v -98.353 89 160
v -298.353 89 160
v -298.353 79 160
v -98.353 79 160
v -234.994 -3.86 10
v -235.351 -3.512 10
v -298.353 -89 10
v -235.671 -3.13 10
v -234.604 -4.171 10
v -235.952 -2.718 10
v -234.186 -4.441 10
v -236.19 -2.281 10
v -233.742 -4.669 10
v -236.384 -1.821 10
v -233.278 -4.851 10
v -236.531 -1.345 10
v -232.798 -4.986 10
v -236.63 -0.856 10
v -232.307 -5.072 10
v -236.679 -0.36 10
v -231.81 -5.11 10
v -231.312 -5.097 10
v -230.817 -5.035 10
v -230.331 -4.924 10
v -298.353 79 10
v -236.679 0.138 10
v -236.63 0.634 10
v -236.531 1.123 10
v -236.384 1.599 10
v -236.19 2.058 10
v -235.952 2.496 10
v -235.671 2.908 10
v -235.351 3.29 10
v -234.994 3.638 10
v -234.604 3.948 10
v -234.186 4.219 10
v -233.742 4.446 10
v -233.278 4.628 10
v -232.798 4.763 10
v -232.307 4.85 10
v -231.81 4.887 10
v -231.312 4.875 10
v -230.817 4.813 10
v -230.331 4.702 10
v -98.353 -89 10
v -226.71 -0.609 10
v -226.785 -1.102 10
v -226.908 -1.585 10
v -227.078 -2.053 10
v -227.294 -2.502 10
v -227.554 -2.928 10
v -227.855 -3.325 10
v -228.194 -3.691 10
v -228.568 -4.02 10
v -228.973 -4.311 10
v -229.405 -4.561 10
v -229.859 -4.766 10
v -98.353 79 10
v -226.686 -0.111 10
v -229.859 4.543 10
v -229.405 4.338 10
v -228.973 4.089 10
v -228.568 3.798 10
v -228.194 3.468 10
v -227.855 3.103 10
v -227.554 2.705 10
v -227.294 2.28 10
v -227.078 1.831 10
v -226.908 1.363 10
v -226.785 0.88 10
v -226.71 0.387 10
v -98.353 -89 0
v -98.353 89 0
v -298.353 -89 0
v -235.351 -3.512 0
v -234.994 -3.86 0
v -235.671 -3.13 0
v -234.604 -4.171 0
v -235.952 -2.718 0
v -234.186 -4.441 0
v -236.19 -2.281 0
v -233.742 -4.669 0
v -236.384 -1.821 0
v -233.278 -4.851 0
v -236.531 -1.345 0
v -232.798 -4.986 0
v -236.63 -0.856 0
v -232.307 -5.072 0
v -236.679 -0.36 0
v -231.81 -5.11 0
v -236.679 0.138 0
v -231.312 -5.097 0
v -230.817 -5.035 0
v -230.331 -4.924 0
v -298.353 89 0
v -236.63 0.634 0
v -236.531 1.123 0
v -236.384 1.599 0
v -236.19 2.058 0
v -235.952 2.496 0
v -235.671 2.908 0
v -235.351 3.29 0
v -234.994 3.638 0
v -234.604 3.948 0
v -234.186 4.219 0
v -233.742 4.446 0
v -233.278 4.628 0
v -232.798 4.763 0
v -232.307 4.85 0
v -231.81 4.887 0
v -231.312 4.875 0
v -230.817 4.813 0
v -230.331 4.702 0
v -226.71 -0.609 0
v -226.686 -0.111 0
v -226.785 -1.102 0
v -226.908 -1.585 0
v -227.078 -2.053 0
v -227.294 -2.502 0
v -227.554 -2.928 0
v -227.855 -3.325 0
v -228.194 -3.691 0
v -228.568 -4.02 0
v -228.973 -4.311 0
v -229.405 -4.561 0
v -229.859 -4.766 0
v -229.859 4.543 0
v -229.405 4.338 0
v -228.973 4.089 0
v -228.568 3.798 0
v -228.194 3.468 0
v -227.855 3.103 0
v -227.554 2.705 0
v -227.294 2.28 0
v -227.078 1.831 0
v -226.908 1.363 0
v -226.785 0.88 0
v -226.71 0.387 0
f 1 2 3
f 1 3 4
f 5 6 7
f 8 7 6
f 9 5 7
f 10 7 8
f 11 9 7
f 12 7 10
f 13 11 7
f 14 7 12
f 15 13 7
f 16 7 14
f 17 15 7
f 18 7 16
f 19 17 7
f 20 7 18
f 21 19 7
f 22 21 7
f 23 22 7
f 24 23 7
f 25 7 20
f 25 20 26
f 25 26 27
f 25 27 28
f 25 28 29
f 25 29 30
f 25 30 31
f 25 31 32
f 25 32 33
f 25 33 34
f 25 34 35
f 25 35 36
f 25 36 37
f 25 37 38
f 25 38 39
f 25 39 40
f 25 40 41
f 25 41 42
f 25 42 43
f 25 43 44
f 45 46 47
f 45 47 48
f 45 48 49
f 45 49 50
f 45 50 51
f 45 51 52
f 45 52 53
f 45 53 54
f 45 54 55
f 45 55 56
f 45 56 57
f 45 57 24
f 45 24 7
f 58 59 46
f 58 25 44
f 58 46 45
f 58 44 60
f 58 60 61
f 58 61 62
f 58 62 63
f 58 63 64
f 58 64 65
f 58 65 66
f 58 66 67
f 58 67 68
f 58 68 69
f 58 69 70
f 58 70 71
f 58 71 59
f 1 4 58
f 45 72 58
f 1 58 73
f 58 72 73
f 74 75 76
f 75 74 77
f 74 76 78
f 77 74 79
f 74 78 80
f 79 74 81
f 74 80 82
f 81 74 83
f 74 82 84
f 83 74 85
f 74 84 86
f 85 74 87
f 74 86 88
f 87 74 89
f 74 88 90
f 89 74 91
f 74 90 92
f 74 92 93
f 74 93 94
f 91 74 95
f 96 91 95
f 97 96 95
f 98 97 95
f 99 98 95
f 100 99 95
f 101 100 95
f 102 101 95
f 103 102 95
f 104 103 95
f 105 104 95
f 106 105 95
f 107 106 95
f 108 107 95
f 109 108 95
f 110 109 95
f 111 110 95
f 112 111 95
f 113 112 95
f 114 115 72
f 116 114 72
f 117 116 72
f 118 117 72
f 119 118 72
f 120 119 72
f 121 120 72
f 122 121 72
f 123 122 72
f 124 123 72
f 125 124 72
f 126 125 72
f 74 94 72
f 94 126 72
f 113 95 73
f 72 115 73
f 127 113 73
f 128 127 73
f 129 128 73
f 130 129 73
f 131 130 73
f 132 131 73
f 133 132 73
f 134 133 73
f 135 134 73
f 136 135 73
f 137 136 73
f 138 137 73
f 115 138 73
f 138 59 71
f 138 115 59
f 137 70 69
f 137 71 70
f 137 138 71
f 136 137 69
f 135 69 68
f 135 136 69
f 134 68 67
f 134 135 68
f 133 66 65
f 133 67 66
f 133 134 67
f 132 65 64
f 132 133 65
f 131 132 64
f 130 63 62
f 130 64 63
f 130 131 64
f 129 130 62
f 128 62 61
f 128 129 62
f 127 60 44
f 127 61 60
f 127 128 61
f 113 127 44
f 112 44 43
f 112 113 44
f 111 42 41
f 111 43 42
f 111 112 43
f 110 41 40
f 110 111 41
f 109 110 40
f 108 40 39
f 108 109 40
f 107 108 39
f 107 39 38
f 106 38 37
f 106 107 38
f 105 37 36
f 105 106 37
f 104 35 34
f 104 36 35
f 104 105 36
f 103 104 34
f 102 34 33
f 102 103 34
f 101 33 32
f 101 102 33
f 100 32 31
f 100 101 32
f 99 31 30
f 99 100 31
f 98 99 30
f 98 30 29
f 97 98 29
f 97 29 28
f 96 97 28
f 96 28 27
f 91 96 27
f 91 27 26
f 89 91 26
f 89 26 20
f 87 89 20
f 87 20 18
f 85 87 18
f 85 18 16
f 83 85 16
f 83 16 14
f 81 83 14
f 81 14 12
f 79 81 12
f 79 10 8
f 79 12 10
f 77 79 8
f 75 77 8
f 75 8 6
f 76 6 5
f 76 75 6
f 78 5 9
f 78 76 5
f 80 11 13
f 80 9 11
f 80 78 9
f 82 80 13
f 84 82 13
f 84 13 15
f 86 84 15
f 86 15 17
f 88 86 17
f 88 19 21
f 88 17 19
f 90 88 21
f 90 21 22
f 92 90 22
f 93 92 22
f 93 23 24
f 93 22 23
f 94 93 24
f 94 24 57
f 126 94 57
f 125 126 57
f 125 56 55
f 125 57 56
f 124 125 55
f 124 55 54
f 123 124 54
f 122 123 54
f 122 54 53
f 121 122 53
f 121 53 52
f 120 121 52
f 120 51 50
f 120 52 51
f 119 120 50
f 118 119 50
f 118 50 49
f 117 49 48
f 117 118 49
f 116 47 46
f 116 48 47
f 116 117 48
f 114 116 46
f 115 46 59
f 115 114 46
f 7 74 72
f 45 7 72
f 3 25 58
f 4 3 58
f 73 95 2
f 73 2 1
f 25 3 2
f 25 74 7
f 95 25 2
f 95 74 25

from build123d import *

# Parameters (mm, degrees)
ESBO_O1_W                  = 200
ESBO_O1_H                  = 178
RESSALTO_EXTRUS_O1_DEPTH   = 10
ESBO_O3_W                  = 200
ESBO_O3_H                  = 10
RESSALTO_EXTRUS_O2_DEPTH   = 150
CORTE_EXTRUS_O1_DEPTH      = 346.594052101
CORTE_EXTRUS_O1_DEPTH_BACK = 346.594052101
ESBO_O4_R                  = 5


with BuildPart() as part:
    # Esboço1 → Ressalto-extrusão1 (new body)
    with BuildSketch(Plane.XY):
        with Locations((-198.352557971, 0)):
            Rectangle(ESBO_O1_W, ESBO_O1_H)
    extrude(amount=RESSALTO_EXTRUS_O1_DEPTH)

    # Esboço3 → Ressalto-extrusão2 (add)
    with BuildSketch(Plane.XY.offset(10)):
        with Locations((-198.352557971, 84)):
            Rectangle(ESBO_O3_W, ESBO_O3_H)
    extrude(amount=RESSALTO_EXTRUS_O2_DEPTH)

    # Esboço4 → Corte-extrusão1 (cut, two sides: drawn at the far end of the back side and taken through both)
    with BuildSketch(Plane.XY.offset(10).offset(-CORTE_EXTRUS_O1_DEPTH_BACK)):
        with Locations((-231.685557971, -0.1112)):
            Circle(ESBO_O4_R)
    extrude(amount=CORTE_EXTRUS_O1_DEPTH + CORTE_EXTRUS_O1_DEPTH_BACK, mode=Mode.SUBTRACT)


solid = part.part
